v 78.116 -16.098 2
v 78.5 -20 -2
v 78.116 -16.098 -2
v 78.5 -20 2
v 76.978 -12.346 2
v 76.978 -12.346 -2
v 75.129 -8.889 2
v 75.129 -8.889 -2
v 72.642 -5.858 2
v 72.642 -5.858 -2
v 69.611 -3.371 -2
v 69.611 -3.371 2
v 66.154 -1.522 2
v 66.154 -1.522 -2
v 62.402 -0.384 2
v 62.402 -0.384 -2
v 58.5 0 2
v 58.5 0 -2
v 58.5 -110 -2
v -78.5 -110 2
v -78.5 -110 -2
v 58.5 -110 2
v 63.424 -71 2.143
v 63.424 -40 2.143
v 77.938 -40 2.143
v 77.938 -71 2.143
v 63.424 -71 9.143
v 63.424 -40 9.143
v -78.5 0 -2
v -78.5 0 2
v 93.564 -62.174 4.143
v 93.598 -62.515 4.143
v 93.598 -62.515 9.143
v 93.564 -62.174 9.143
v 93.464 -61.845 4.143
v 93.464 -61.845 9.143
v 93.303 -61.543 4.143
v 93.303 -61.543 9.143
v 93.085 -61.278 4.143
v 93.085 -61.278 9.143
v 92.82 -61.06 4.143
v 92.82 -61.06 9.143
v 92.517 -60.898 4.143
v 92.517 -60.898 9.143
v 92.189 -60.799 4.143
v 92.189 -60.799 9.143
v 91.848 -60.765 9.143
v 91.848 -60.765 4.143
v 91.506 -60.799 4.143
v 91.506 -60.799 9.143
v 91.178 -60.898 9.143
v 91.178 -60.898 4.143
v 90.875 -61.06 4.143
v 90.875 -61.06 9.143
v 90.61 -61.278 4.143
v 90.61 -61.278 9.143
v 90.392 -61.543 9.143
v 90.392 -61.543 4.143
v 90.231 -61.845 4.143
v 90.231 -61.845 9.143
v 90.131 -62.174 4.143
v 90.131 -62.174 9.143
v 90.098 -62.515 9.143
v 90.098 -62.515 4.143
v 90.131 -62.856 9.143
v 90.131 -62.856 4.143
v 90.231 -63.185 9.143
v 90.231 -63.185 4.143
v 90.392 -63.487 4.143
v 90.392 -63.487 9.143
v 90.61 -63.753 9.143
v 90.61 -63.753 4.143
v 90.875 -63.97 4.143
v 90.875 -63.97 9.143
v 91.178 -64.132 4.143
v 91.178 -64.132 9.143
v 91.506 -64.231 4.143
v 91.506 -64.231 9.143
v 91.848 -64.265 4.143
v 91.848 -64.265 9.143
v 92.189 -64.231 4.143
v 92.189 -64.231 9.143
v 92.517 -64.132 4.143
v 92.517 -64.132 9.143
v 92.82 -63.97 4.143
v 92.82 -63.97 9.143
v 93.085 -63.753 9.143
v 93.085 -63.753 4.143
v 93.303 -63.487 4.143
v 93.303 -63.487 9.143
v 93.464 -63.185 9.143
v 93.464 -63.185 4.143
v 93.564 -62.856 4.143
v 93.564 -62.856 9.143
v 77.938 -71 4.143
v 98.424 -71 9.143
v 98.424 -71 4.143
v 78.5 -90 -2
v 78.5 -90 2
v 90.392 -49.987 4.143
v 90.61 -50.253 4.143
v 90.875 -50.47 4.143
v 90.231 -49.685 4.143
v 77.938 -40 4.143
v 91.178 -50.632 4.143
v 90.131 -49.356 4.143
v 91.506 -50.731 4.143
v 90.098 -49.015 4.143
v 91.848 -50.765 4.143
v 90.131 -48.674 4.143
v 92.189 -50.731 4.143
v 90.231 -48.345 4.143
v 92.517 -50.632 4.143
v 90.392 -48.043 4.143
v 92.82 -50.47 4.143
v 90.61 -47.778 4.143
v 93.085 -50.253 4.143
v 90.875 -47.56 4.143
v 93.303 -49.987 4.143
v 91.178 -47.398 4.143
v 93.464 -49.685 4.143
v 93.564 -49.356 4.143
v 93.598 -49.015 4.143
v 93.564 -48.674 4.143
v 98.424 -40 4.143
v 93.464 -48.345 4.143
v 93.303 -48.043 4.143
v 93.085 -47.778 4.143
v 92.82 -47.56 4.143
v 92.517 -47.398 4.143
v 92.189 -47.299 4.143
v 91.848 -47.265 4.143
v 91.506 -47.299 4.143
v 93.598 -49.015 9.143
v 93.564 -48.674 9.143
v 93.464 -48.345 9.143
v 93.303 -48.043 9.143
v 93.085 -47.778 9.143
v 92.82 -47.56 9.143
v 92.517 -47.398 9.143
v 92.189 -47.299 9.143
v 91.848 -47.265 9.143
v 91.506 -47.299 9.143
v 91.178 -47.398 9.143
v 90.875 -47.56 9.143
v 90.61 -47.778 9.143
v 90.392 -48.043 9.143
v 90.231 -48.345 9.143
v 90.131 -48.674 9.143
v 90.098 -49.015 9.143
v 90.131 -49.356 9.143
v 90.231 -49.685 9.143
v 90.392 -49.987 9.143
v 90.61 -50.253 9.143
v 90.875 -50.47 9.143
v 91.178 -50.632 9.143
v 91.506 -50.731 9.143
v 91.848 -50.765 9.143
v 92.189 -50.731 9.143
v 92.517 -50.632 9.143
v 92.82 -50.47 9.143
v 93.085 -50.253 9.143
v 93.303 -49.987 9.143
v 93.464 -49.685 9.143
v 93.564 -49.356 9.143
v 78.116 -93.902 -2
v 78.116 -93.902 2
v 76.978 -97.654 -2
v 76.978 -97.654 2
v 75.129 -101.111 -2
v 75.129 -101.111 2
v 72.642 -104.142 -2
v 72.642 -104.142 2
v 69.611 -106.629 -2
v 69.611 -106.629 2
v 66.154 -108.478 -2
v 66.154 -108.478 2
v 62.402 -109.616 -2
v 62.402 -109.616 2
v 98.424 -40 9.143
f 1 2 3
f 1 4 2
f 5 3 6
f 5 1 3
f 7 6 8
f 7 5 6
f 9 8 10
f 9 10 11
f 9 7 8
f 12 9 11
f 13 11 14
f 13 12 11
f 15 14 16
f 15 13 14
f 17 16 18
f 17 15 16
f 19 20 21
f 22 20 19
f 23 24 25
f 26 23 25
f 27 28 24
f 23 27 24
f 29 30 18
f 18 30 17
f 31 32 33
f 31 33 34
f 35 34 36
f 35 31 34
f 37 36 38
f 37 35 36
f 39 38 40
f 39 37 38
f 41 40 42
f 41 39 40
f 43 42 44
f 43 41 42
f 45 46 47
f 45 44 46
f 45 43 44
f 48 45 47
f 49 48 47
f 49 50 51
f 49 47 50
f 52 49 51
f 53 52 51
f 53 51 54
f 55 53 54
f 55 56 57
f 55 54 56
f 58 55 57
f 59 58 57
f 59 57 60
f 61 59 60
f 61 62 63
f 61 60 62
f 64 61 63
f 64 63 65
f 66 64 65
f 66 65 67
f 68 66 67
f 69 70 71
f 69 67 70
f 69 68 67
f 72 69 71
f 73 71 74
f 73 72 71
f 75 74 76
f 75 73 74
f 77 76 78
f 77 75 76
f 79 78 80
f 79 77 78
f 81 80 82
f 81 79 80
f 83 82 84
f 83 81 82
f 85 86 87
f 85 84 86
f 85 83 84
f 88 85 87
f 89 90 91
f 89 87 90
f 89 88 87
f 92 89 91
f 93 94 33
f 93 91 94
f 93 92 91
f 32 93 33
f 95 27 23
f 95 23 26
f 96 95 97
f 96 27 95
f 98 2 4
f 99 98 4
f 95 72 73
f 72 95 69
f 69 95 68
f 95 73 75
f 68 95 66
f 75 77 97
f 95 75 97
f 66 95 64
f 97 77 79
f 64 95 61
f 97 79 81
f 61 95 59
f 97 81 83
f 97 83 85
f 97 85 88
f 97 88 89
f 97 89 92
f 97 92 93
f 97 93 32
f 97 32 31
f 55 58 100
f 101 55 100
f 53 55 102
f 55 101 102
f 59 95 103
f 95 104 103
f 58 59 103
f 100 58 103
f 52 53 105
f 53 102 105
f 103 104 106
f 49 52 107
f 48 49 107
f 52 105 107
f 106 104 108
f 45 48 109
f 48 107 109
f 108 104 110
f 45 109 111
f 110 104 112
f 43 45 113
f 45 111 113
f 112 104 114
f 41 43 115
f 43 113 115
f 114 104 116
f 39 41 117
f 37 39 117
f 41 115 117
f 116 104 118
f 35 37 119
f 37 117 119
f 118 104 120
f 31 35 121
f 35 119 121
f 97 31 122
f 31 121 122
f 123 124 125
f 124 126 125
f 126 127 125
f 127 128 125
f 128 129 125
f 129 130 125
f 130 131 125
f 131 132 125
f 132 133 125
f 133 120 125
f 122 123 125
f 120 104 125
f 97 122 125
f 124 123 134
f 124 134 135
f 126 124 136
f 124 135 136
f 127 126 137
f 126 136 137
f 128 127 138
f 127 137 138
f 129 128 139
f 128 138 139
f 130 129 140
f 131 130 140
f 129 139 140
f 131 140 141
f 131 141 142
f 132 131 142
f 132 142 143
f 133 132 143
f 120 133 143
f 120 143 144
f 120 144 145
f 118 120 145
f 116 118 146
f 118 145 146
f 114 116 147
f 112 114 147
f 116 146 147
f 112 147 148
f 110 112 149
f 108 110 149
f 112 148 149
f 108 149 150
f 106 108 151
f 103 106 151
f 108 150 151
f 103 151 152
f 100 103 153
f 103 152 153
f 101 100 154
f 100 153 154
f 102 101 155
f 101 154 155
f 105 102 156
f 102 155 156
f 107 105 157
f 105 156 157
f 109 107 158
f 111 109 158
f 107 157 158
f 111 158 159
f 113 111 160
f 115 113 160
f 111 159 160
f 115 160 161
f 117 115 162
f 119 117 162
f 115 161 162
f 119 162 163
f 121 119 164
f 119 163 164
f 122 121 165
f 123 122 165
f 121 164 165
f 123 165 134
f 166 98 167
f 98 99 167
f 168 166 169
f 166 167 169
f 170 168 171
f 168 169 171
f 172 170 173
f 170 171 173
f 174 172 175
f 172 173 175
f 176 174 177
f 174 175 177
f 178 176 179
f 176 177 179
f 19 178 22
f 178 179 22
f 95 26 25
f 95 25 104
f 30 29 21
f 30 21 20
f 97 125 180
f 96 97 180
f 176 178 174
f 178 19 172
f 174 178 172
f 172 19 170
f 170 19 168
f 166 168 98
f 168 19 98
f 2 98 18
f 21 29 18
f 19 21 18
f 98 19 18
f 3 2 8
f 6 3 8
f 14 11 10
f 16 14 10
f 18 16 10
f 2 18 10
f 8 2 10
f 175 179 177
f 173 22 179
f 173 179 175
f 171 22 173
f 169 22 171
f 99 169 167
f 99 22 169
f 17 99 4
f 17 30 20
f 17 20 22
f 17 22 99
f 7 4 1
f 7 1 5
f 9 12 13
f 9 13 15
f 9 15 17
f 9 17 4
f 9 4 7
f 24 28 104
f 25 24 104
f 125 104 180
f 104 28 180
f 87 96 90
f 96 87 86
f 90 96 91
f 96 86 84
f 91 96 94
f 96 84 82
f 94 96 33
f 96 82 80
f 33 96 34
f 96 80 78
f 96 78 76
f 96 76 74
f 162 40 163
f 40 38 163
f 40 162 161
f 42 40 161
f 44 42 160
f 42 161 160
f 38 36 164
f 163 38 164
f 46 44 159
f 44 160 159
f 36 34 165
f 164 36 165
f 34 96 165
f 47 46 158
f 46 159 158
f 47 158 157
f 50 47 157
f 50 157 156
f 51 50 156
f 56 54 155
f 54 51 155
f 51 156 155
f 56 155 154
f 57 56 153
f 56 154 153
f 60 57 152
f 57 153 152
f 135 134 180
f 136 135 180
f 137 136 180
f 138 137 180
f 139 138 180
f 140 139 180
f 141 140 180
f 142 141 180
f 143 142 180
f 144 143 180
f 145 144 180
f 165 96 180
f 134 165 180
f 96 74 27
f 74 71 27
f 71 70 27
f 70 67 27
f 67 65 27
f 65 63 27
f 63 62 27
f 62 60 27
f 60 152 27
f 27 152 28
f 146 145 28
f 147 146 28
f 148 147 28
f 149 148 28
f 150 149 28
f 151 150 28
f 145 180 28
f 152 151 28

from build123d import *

# Parameters (mm, degrees)
F0_W     = 157
F0_H     = 4
F1_DEPTH = 110
F3_DEPTH = 71
F4_DEPTH = 40
F5_R     = 20
F6_R     = 20
F7_R     = 1.75
F8_DEPTH = 12.5
F9_DEPTH = 12.5


with BuildPart() as f1:
    # F0 (on Front) → F1 (new body)
    with BuildSketch(Plane.XZ):
        Rectangle(F0_W, F0_H)
    extrude(amount=F1_DEPTH)

    # F5
    f5_edges = [f1.edges().sort_by_distance(p)[0] for p in [
        (78.5, -110, 0),
    ]]
    fillet(f5_edges, radius=F5_R)

    # F6
    f6_edges = [f1.edges().sort_by_distance(p)[0] for p in [
        (78.5, 0, 0),
    ]]
    fillet(f6_edges, radius=F6_R)


with BuildPart() as f3:
    # F2 (on Front) → F3 (new body)
    with BuildSketch(Plane.XZ):
        Polygon((63.42411, 9.142857), (63.42411, 2.142857), (77.937506, 2.142857), (77.937506, 4.142857), (98.42411, 4.142857), (98.42411, 9.142857), align=None)
    extrude(amount=F3_DEPTH)

    # F2 (on Front) → F4 (cut)
    with BuildSketch(Plane.XZ):
        Polygon((63.42411, 9.142857), (63.42411, 2.142857), (77.937506, 2.142857), (77.937506, 4.142857), (98.42411, 4.142857), (98.42411, 9.142857), align=None)
    extrude(amount=F4_DEPTH, mode=Mode.SUBTRACT)

    # F7 (on Top) → F8 (join, symmetric)
    with BuildSketch(Plane.XY):
        with Locations((91.847509, -62.51508)):
            Circle(F7_R)
        with Locations((91.847509, -49.01508)):
            Circle(F7_R)
    extrude(amount=F8_DEPTH, both=True)

    # F7 (on Top) → F9 (cut, symmetric)
    with BuildSketch(Plane.XY):
        with Locations((91.847509, -62.51508)):
            Circle(F7_R)
        with Locations((91.847509, -49.01508)):
            Circle(F7_R)
    extrude(amount=F9_DEPTH, both=True, mode=Mode.SUBTRACT)


solid = Compound([f1.part, f3.part])
